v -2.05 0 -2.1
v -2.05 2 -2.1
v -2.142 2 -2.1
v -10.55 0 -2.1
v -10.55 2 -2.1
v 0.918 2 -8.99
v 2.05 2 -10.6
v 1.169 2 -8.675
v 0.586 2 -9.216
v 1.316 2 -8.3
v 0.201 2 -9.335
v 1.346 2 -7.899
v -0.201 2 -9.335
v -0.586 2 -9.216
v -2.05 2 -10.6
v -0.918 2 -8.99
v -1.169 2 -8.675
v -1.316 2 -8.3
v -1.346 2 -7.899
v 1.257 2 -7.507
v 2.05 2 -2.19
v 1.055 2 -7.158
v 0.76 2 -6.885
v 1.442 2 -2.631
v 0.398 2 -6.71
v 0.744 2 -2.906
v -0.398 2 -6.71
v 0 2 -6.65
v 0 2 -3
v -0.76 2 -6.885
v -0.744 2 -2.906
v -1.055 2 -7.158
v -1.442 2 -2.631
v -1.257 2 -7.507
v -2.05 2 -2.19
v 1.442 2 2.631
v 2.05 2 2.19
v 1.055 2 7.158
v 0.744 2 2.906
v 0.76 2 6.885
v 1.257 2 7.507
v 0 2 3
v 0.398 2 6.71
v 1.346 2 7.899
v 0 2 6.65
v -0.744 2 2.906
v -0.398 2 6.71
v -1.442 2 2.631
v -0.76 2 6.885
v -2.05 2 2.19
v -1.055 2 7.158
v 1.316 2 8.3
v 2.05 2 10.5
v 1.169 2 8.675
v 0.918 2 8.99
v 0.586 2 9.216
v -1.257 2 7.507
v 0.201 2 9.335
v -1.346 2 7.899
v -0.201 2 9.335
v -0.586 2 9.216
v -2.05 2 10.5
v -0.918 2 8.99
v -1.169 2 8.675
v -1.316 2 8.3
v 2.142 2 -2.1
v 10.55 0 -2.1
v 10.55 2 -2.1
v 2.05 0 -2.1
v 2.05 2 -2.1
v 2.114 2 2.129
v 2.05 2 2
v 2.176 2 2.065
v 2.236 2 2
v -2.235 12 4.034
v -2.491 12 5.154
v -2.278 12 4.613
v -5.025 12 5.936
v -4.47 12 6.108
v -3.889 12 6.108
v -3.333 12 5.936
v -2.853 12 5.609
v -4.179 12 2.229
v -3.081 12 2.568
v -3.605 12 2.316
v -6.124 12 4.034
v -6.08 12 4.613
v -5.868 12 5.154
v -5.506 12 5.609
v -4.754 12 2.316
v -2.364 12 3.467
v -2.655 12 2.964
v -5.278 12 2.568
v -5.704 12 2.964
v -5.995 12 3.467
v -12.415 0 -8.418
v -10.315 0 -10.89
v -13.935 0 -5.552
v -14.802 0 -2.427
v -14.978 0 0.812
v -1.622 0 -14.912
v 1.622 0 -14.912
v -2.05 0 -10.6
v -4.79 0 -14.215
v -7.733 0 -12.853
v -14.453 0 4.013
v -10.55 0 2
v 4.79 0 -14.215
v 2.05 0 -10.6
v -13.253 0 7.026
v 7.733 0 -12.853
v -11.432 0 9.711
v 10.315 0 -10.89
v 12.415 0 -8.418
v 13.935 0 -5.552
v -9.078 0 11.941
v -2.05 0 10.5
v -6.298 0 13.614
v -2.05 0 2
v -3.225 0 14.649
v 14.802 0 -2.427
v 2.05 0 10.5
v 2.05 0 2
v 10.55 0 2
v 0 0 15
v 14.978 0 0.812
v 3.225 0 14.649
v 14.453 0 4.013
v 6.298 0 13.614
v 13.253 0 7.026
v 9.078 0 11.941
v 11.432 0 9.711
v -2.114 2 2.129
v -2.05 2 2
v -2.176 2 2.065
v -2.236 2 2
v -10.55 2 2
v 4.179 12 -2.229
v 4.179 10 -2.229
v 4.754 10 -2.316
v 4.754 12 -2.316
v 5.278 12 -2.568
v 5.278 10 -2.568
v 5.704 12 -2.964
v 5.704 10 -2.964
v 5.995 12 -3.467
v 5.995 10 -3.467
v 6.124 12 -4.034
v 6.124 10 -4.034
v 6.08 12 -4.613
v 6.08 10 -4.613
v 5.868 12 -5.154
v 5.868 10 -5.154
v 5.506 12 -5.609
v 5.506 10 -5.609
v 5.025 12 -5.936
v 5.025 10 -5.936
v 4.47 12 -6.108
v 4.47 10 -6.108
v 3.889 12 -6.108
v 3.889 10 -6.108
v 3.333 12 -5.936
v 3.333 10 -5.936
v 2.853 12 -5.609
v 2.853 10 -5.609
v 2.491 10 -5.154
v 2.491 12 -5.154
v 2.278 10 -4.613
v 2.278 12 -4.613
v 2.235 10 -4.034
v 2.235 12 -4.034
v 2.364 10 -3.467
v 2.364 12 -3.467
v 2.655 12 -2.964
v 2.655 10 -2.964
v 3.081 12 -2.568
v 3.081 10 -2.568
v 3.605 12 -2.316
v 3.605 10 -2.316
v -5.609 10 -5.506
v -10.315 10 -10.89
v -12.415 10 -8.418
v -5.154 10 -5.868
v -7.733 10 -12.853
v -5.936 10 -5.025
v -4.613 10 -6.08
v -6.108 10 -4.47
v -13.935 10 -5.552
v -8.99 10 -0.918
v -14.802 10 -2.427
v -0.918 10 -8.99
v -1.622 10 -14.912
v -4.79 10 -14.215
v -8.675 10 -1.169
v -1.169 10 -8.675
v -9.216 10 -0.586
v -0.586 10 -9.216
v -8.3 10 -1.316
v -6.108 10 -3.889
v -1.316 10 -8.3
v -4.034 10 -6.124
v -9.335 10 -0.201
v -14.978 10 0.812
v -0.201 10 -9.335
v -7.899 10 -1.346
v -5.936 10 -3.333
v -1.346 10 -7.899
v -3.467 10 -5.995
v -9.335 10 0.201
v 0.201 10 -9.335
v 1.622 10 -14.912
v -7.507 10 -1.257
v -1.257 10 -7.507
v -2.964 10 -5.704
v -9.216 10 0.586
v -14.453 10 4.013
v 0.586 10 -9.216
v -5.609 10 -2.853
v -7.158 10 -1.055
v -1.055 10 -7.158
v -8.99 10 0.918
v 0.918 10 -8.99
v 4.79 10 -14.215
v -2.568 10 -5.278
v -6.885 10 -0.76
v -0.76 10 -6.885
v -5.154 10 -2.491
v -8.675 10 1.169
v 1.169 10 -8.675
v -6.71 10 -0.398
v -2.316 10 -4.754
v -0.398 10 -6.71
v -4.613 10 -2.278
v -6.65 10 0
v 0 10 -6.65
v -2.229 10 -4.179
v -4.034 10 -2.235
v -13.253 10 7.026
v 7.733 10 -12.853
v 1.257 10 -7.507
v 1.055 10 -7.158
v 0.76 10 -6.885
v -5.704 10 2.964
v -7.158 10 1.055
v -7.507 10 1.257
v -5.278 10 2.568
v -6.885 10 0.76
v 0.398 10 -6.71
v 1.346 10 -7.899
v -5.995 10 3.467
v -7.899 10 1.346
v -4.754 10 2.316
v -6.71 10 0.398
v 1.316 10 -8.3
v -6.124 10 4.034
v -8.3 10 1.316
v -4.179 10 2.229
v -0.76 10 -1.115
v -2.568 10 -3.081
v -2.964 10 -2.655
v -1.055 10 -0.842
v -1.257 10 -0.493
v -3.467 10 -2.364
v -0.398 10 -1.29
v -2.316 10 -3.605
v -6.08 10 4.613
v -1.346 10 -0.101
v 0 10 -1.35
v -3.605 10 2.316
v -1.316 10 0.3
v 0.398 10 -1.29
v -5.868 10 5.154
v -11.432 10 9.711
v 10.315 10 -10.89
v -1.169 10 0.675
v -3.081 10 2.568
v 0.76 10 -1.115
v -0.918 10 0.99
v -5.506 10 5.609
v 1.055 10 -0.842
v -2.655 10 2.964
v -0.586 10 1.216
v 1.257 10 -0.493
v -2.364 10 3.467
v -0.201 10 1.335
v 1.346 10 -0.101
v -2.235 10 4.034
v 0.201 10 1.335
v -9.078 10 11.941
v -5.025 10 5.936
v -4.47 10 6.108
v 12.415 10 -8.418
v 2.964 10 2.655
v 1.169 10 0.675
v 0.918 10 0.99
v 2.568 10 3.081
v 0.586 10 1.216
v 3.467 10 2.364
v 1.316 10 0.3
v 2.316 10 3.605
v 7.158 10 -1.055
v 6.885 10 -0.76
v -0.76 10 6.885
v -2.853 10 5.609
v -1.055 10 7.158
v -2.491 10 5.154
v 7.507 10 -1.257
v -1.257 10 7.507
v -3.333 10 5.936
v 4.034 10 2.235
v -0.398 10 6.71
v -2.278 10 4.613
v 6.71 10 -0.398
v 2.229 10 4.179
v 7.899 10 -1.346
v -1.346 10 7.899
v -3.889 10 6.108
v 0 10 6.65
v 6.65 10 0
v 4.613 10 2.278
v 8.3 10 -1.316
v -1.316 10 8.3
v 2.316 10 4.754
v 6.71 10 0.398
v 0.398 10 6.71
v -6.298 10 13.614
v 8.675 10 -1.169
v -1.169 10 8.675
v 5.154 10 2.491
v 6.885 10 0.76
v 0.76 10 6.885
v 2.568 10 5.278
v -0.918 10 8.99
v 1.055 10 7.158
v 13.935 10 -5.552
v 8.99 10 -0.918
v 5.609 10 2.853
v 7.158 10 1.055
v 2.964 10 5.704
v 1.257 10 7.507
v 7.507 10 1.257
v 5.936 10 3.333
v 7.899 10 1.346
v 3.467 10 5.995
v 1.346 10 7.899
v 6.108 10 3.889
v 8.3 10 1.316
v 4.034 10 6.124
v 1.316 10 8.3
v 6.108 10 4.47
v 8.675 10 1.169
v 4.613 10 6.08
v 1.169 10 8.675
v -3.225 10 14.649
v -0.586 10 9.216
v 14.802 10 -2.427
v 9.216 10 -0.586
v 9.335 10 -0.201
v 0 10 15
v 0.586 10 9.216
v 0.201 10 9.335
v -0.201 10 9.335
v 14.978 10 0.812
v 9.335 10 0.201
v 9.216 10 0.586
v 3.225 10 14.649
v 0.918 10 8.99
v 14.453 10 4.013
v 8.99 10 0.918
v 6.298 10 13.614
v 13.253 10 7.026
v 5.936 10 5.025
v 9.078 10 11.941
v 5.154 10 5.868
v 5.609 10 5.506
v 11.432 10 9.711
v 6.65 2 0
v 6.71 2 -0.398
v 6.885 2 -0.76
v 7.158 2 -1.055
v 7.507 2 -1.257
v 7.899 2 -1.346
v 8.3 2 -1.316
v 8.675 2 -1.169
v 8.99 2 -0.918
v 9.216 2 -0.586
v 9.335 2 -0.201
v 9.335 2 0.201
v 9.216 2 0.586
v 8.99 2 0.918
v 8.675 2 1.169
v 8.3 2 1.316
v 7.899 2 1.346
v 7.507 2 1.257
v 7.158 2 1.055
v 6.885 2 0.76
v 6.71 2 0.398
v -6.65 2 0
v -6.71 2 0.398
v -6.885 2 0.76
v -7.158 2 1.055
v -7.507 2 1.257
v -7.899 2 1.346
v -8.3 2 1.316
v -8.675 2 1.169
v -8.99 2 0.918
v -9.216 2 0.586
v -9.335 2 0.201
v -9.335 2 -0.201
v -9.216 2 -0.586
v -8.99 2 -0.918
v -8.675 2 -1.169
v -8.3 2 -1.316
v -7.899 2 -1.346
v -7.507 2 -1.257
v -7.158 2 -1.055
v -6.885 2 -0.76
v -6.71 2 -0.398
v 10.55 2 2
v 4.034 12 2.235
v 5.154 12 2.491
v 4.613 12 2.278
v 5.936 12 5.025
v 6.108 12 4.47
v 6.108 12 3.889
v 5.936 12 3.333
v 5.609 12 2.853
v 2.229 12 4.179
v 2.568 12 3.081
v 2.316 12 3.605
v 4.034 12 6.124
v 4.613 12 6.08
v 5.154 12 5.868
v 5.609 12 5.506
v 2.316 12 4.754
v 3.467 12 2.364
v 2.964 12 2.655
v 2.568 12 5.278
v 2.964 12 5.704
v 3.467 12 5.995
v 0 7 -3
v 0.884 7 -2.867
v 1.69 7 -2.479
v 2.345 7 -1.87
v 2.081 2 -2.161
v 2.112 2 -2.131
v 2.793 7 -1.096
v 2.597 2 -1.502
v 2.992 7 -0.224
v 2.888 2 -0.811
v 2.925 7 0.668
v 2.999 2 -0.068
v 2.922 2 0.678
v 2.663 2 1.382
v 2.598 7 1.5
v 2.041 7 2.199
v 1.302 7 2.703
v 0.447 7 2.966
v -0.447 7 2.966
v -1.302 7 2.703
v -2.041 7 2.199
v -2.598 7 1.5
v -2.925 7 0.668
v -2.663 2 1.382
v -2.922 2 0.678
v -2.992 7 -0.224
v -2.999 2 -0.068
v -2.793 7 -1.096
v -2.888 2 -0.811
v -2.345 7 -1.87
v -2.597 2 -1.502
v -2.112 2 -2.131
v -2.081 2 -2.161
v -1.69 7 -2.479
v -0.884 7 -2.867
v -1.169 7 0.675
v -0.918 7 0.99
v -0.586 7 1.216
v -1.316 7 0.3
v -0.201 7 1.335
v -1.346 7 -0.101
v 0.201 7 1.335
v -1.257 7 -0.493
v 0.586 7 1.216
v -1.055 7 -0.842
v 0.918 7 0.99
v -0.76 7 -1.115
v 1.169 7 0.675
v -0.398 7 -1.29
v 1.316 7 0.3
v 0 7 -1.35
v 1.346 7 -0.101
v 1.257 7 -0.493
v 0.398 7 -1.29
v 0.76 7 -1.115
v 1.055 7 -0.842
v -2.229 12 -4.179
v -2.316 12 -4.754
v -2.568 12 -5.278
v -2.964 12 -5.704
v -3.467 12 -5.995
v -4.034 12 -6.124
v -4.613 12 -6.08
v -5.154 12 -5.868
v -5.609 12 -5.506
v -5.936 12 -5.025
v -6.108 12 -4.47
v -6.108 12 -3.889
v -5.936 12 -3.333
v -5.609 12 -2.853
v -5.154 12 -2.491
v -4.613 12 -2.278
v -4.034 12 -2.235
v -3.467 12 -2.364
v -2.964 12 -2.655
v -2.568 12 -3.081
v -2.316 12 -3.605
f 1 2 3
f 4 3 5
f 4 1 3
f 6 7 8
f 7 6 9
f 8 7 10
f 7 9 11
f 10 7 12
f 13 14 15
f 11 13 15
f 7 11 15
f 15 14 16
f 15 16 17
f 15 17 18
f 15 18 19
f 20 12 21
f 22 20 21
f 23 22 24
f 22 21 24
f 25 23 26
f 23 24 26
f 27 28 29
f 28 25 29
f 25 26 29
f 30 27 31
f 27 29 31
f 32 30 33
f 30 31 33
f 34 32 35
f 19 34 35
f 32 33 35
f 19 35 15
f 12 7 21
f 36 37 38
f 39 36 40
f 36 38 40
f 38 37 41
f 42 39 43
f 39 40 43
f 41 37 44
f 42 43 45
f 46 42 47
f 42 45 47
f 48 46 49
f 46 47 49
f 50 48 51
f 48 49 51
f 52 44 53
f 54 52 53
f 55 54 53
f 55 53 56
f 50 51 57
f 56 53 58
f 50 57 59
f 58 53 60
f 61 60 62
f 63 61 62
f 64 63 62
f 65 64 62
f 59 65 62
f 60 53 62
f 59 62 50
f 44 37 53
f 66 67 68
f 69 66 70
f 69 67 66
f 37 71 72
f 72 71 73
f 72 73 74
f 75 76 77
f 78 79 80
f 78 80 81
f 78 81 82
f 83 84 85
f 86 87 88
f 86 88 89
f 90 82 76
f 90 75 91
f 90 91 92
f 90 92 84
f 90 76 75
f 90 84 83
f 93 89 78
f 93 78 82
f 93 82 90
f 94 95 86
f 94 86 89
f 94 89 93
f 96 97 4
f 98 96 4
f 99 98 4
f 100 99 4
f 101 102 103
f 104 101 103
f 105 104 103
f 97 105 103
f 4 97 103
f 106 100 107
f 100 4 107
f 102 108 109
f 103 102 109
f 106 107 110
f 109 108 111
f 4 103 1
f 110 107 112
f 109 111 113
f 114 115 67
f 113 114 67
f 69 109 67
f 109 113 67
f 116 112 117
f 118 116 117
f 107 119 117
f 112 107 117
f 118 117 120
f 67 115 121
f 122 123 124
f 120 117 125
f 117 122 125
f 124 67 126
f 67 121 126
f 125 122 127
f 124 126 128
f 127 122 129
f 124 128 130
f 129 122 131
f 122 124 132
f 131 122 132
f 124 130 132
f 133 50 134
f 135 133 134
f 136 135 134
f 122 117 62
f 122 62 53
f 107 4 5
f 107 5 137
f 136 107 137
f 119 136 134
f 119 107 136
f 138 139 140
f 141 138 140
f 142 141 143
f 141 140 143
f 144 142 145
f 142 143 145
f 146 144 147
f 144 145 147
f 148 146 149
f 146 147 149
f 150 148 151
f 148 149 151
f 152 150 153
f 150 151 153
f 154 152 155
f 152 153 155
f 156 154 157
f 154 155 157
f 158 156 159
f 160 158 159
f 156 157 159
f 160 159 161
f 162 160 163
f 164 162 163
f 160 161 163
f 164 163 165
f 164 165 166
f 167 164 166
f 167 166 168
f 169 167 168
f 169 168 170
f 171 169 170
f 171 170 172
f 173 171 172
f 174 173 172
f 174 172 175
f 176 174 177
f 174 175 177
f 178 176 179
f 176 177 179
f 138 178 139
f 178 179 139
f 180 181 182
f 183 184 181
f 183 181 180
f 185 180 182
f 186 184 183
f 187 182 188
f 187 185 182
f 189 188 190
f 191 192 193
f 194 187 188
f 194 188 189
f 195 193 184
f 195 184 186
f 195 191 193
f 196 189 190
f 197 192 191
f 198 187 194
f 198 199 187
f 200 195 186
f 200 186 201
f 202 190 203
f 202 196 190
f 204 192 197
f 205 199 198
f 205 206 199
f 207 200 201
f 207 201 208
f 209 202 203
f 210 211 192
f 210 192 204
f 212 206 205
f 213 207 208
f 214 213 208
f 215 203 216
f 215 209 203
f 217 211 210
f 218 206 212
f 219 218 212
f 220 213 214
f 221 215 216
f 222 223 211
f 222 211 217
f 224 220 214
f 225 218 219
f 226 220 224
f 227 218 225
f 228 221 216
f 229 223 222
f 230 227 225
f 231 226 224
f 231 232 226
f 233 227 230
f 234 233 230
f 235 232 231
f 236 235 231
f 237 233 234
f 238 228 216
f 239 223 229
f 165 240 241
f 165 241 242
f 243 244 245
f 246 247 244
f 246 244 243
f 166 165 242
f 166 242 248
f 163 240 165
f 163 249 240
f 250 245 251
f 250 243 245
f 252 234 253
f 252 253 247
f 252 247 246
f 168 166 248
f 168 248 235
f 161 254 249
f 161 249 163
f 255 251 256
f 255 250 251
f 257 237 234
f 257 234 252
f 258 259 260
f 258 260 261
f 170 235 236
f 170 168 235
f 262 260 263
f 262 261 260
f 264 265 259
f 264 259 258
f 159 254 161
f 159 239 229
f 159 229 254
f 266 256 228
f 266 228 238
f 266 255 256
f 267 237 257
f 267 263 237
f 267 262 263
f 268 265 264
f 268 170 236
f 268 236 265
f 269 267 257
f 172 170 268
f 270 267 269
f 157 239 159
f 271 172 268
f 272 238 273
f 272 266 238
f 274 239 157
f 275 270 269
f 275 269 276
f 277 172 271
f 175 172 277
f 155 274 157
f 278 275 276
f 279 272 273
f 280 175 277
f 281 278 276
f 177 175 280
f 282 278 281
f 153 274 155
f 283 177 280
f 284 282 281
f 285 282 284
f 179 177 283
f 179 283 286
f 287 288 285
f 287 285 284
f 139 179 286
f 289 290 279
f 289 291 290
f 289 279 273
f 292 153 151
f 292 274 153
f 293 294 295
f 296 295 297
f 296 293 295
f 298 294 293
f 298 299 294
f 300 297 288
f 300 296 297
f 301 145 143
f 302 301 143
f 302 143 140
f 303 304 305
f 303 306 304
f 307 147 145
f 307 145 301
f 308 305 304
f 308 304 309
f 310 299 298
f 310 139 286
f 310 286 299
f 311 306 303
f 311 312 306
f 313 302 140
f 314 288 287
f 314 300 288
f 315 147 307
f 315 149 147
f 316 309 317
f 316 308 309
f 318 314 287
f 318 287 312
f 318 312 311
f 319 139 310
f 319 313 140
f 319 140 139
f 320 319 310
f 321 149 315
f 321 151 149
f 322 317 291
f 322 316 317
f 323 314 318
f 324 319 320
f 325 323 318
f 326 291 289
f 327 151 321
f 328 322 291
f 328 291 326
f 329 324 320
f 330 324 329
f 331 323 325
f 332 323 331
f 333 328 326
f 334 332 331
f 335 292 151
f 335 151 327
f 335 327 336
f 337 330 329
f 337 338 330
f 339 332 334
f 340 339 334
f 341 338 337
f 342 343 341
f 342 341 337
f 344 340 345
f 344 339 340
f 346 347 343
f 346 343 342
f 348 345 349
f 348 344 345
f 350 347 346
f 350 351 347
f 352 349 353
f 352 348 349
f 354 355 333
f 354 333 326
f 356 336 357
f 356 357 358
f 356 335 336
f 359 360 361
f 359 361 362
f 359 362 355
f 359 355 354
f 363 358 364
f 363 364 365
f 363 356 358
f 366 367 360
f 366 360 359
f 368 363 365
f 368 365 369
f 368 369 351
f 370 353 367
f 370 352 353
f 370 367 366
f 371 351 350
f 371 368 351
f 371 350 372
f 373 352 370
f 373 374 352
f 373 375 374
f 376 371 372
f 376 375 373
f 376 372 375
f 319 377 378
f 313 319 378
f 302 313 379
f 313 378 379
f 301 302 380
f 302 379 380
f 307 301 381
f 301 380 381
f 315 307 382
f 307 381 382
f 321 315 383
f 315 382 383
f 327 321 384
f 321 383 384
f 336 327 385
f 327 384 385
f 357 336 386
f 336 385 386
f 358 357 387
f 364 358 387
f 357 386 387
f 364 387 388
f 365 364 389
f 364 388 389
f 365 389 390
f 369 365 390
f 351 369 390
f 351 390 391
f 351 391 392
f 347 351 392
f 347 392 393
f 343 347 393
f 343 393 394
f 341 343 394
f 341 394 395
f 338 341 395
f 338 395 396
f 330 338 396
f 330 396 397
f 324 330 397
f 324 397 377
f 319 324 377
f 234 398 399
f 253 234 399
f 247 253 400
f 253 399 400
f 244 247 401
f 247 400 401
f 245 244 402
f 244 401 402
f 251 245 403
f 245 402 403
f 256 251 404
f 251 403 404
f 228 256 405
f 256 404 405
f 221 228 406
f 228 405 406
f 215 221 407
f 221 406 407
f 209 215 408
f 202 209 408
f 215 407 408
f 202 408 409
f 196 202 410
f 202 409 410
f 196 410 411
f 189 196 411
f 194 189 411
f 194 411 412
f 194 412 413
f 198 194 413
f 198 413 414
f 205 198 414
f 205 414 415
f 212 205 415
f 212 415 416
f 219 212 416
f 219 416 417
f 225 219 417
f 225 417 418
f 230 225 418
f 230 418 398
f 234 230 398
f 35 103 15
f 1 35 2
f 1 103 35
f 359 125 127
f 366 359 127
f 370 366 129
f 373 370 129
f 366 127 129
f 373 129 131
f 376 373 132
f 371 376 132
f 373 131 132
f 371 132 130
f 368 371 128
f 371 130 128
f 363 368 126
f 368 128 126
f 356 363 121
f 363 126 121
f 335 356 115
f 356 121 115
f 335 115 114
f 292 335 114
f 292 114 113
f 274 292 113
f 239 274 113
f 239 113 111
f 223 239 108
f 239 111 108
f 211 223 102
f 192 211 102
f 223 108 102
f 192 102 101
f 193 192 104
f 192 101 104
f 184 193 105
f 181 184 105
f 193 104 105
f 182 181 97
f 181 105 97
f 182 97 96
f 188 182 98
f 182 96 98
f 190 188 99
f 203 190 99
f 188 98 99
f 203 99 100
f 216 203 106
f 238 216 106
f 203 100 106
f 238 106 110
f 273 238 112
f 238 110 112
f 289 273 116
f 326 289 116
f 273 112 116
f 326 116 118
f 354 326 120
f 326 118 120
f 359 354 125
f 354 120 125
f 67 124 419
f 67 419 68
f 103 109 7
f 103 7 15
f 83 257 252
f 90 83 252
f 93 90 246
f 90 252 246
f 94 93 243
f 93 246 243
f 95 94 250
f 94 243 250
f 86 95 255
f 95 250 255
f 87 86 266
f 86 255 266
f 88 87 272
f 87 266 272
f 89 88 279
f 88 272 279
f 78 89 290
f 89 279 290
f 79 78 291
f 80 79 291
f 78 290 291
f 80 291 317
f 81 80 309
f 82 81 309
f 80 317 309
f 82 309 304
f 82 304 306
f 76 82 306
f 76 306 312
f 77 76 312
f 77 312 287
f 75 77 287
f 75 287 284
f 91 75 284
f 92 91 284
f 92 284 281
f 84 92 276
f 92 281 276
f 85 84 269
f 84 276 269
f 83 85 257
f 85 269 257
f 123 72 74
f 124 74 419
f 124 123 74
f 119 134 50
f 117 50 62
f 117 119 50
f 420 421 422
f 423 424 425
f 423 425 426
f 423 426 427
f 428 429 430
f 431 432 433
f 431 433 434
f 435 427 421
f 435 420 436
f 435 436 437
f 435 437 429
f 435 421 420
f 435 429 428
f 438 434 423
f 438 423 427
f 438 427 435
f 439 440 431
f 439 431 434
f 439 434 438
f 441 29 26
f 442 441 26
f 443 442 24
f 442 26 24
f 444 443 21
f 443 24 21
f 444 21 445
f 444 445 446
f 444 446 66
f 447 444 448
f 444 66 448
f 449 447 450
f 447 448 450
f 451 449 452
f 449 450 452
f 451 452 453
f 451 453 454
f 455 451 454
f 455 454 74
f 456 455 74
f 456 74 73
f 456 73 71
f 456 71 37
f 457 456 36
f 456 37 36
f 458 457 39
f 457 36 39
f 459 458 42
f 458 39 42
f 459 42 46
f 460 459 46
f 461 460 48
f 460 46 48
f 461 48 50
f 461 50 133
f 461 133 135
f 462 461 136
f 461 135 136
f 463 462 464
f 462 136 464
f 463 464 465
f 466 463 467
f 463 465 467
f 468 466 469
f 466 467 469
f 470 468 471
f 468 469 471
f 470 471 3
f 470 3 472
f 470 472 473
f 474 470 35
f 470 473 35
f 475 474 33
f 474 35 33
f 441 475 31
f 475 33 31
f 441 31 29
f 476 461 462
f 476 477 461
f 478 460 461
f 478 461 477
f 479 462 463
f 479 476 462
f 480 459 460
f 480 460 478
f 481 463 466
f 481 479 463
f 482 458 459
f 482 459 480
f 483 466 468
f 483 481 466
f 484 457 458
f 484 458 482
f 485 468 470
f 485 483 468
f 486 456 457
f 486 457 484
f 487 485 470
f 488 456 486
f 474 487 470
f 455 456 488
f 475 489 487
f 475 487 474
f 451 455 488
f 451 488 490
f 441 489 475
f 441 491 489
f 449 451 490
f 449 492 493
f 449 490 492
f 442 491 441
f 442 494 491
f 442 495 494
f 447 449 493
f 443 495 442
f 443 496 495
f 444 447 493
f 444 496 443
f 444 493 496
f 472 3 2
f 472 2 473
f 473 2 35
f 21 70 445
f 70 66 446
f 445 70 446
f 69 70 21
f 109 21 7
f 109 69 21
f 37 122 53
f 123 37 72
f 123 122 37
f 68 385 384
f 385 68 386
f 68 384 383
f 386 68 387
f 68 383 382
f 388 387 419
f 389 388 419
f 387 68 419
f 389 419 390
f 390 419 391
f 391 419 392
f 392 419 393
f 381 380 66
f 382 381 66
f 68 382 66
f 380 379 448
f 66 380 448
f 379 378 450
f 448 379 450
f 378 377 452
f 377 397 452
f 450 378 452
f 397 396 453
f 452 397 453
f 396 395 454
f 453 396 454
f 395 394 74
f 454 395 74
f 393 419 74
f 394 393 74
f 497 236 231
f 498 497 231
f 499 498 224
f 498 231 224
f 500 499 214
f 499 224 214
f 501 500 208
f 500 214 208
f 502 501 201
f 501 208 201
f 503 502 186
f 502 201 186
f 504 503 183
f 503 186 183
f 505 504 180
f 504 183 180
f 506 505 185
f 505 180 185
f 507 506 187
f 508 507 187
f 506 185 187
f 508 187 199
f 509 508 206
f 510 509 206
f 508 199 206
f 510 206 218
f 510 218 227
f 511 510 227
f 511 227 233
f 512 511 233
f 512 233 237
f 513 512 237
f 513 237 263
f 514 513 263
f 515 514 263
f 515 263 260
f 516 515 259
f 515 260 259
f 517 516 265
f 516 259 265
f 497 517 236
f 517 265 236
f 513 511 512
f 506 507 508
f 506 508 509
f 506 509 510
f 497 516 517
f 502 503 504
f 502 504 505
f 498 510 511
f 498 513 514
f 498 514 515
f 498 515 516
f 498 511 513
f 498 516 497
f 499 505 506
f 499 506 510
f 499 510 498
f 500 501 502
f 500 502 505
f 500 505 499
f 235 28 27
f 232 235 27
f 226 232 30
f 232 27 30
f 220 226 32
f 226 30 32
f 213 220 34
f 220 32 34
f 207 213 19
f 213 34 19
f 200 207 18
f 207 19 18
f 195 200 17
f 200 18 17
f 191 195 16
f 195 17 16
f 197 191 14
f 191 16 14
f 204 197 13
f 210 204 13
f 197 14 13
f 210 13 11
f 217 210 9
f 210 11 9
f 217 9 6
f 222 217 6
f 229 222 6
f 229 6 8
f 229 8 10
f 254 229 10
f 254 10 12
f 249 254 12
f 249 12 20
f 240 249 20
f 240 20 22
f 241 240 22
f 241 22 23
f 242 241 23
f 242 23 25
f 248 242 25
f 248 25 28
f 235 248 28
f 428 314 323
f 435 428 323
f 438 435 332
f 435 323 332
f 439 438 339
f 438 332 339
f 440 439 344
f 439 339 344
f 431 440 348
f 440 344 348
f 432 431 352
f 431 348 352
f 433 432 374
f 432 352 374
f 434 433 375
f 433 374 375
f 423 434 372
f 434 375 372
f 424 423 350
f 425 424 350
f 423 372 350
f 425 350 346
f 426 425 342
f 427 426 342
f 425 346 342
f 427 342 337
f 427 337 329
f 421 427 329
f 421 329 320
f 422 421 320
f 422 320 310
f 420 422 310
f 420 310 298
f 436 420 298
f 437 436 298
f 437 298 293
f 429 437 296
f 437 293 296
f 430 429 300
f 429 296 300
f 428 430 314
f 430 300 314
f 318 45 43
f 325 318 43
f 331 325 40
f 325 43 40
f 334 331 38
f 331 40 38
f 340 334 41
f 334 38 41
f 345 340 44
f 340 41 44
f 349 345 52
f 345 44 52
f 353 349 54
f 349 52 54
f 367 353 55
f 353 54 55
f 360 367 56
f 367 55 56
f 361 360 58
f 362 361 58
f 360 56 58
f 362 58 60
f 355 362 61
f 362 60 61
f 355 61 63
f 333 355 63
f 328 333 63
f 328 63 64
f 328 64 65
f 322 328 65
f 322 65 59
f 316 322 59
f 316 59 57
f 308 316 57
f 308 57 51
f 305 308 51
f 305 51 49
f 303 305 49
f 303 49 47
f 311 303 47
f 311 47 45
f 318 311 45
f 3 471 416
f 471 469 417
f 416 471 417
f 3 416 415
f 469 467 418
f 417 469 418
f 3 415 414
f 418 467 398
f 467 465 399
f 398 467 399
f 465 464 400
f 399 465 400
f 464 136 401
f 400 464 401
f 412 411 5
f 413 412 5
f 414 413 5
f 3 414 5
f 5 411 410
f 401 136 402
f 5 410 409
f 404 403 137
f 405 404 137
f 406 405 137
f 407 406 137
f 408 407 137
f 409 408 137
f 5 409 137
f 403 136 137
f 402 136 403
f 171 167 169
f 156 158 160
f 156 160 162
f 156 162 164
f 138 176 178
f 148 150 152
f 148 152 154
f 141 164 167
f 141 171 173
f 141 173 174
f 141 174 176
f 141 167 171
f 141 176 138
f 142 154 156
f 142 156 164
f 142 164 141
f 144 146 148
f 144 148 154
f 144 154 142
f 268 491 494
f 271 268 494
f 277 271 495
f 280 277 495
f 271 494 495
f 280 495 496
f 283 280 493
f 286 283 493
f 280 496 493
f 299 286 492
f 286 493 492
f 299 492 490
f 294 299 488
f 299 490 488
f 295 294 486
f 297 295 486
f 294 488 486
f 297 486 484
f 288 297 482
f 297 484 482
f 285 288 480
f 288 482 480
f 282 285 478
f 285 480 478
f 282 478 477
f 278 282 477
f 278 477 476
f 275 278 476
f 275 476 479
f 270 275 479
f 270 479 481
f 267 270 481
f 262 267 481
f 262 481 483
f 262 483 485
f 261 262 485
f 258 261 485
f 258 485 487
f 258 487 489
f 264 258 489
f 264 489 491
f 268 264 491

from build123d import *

# Parameters (mm, degrees)
SKETCH1_R           = 15
BOSS_EXTRUDE1_DEPTH = 10
SKETCH2_R           = 1.95
BOSS_EXTRUDE2_DEPTH = 2
CUT_EXTRUDE1_DEPTH  = 2
SKETCH4_R           = 1.35
CUT_EXTRUDE2_DEPTH  = 24.452078799
CIRPATTERN2_COUNT   = 4
CIRPATTERN3_COUNT   = 4
SKETCH5_R           = 3
CUT_EXTRUDE3_DEPTH  = 5
SKETCH6_R           = 1.35
CUT_EXTRUDE4_DEPTH  = 23.338307904


with BuildPart() as part:
    # Sketch1 → Boss-Extrude1 (new body)
    with BuildSketch(Plane(origin=(0, 0, 0), x_dir=(1, 0, 0), z_dir=(0, 1, 0))):
        Circle(SKETCH1_R)
    extrude(amount=BOSS_EXTRUDE1_DEPTH)

    # Sketch2 → Boss-Extrude2 (add)
    with BuildSketch(Plane(origin=(0, 10, 0), x_dir=(1, 0, 0), z_dir=(0, 1, 0))):
        with Locations((4.179388408, 4.179388408)):
            Circle(SKETCH2_R)
    boss_extrude2 = extrude(amount=BOSS_EXTRUDE2_DEPTH)

    # Sketch3 → Cut-Extrude1 (cut)
    with BuildSketch(Plane.XZ):
        Polygon((-2.05, 10.5), (2.05, 10.5), (2.05, 2), (10.55, 2), (10.55, -2.1), (2.05, -2.1), (2.05, -10.6), (-2.05, -10.6), (-2.05, -2.1), (-10.55, -2.1), (-10.55, 2), (-2.05, 2), align=None)
    extrude(amount=-CUT_EXTRUDE1_DEPTH, mode=Mode.SUBTRACT)

    # Sketch4 → Cut-Extrude2 (cut, through all)
    with BuildSketch(Plane.XZ.offset(-2)):
        with Locations((0, 8)):
            Circle(SKETCH4_R)
    cut_extrude2 = extrude(amount=-CUT_EXTRUDE2_DEPTH, mode=Mode.SUBTRACT)

    # CirPattern2: Cut-Extrude2 ×4 about axis
    cirpattern2_axis = Axis((0, 0, 0), (0, 1, 0))
    for i in range(1, CIRPATTERN2_COUNT):
        add(cut_extrude2.rotate(cirpattern2_axis, i * 360 / CIRPATTERN2_COUNT), mode=Mode.SUBTRACT)

    # CirPattern3: Boss-Extrude2 ×4 about axis
    cirpattern3_axis = Axis((0, 10, 0), (0, 1, 0))
    for i in range(1, CIRPATTERN3_COUNT):
        add(boss_extrude2.rotate(cirpattern3_axis, i * 360 / CIRPATTERN3_COUNT))

    # Sketch5 → Cut-Extrude3 (cut)
    with BuildSketch(Plane.XZ.offset(-2)):
        Circle(SKETCH5_R)
    extrude(amount=-CUT_EXTRUDE3_DEPTH, mode=Mode.SUBTRACT)

    # Sketch6 → Cut-Extrude4 (cut, through all)
    with BuildSketch(Plane.XZ.offset(-7)):
        Circle(SKETCH6_R)
    extrude(amount=-CUT_EXTRUDE4_DEPTH, mode=Mode.SUBTRACT)


solid = part.part
